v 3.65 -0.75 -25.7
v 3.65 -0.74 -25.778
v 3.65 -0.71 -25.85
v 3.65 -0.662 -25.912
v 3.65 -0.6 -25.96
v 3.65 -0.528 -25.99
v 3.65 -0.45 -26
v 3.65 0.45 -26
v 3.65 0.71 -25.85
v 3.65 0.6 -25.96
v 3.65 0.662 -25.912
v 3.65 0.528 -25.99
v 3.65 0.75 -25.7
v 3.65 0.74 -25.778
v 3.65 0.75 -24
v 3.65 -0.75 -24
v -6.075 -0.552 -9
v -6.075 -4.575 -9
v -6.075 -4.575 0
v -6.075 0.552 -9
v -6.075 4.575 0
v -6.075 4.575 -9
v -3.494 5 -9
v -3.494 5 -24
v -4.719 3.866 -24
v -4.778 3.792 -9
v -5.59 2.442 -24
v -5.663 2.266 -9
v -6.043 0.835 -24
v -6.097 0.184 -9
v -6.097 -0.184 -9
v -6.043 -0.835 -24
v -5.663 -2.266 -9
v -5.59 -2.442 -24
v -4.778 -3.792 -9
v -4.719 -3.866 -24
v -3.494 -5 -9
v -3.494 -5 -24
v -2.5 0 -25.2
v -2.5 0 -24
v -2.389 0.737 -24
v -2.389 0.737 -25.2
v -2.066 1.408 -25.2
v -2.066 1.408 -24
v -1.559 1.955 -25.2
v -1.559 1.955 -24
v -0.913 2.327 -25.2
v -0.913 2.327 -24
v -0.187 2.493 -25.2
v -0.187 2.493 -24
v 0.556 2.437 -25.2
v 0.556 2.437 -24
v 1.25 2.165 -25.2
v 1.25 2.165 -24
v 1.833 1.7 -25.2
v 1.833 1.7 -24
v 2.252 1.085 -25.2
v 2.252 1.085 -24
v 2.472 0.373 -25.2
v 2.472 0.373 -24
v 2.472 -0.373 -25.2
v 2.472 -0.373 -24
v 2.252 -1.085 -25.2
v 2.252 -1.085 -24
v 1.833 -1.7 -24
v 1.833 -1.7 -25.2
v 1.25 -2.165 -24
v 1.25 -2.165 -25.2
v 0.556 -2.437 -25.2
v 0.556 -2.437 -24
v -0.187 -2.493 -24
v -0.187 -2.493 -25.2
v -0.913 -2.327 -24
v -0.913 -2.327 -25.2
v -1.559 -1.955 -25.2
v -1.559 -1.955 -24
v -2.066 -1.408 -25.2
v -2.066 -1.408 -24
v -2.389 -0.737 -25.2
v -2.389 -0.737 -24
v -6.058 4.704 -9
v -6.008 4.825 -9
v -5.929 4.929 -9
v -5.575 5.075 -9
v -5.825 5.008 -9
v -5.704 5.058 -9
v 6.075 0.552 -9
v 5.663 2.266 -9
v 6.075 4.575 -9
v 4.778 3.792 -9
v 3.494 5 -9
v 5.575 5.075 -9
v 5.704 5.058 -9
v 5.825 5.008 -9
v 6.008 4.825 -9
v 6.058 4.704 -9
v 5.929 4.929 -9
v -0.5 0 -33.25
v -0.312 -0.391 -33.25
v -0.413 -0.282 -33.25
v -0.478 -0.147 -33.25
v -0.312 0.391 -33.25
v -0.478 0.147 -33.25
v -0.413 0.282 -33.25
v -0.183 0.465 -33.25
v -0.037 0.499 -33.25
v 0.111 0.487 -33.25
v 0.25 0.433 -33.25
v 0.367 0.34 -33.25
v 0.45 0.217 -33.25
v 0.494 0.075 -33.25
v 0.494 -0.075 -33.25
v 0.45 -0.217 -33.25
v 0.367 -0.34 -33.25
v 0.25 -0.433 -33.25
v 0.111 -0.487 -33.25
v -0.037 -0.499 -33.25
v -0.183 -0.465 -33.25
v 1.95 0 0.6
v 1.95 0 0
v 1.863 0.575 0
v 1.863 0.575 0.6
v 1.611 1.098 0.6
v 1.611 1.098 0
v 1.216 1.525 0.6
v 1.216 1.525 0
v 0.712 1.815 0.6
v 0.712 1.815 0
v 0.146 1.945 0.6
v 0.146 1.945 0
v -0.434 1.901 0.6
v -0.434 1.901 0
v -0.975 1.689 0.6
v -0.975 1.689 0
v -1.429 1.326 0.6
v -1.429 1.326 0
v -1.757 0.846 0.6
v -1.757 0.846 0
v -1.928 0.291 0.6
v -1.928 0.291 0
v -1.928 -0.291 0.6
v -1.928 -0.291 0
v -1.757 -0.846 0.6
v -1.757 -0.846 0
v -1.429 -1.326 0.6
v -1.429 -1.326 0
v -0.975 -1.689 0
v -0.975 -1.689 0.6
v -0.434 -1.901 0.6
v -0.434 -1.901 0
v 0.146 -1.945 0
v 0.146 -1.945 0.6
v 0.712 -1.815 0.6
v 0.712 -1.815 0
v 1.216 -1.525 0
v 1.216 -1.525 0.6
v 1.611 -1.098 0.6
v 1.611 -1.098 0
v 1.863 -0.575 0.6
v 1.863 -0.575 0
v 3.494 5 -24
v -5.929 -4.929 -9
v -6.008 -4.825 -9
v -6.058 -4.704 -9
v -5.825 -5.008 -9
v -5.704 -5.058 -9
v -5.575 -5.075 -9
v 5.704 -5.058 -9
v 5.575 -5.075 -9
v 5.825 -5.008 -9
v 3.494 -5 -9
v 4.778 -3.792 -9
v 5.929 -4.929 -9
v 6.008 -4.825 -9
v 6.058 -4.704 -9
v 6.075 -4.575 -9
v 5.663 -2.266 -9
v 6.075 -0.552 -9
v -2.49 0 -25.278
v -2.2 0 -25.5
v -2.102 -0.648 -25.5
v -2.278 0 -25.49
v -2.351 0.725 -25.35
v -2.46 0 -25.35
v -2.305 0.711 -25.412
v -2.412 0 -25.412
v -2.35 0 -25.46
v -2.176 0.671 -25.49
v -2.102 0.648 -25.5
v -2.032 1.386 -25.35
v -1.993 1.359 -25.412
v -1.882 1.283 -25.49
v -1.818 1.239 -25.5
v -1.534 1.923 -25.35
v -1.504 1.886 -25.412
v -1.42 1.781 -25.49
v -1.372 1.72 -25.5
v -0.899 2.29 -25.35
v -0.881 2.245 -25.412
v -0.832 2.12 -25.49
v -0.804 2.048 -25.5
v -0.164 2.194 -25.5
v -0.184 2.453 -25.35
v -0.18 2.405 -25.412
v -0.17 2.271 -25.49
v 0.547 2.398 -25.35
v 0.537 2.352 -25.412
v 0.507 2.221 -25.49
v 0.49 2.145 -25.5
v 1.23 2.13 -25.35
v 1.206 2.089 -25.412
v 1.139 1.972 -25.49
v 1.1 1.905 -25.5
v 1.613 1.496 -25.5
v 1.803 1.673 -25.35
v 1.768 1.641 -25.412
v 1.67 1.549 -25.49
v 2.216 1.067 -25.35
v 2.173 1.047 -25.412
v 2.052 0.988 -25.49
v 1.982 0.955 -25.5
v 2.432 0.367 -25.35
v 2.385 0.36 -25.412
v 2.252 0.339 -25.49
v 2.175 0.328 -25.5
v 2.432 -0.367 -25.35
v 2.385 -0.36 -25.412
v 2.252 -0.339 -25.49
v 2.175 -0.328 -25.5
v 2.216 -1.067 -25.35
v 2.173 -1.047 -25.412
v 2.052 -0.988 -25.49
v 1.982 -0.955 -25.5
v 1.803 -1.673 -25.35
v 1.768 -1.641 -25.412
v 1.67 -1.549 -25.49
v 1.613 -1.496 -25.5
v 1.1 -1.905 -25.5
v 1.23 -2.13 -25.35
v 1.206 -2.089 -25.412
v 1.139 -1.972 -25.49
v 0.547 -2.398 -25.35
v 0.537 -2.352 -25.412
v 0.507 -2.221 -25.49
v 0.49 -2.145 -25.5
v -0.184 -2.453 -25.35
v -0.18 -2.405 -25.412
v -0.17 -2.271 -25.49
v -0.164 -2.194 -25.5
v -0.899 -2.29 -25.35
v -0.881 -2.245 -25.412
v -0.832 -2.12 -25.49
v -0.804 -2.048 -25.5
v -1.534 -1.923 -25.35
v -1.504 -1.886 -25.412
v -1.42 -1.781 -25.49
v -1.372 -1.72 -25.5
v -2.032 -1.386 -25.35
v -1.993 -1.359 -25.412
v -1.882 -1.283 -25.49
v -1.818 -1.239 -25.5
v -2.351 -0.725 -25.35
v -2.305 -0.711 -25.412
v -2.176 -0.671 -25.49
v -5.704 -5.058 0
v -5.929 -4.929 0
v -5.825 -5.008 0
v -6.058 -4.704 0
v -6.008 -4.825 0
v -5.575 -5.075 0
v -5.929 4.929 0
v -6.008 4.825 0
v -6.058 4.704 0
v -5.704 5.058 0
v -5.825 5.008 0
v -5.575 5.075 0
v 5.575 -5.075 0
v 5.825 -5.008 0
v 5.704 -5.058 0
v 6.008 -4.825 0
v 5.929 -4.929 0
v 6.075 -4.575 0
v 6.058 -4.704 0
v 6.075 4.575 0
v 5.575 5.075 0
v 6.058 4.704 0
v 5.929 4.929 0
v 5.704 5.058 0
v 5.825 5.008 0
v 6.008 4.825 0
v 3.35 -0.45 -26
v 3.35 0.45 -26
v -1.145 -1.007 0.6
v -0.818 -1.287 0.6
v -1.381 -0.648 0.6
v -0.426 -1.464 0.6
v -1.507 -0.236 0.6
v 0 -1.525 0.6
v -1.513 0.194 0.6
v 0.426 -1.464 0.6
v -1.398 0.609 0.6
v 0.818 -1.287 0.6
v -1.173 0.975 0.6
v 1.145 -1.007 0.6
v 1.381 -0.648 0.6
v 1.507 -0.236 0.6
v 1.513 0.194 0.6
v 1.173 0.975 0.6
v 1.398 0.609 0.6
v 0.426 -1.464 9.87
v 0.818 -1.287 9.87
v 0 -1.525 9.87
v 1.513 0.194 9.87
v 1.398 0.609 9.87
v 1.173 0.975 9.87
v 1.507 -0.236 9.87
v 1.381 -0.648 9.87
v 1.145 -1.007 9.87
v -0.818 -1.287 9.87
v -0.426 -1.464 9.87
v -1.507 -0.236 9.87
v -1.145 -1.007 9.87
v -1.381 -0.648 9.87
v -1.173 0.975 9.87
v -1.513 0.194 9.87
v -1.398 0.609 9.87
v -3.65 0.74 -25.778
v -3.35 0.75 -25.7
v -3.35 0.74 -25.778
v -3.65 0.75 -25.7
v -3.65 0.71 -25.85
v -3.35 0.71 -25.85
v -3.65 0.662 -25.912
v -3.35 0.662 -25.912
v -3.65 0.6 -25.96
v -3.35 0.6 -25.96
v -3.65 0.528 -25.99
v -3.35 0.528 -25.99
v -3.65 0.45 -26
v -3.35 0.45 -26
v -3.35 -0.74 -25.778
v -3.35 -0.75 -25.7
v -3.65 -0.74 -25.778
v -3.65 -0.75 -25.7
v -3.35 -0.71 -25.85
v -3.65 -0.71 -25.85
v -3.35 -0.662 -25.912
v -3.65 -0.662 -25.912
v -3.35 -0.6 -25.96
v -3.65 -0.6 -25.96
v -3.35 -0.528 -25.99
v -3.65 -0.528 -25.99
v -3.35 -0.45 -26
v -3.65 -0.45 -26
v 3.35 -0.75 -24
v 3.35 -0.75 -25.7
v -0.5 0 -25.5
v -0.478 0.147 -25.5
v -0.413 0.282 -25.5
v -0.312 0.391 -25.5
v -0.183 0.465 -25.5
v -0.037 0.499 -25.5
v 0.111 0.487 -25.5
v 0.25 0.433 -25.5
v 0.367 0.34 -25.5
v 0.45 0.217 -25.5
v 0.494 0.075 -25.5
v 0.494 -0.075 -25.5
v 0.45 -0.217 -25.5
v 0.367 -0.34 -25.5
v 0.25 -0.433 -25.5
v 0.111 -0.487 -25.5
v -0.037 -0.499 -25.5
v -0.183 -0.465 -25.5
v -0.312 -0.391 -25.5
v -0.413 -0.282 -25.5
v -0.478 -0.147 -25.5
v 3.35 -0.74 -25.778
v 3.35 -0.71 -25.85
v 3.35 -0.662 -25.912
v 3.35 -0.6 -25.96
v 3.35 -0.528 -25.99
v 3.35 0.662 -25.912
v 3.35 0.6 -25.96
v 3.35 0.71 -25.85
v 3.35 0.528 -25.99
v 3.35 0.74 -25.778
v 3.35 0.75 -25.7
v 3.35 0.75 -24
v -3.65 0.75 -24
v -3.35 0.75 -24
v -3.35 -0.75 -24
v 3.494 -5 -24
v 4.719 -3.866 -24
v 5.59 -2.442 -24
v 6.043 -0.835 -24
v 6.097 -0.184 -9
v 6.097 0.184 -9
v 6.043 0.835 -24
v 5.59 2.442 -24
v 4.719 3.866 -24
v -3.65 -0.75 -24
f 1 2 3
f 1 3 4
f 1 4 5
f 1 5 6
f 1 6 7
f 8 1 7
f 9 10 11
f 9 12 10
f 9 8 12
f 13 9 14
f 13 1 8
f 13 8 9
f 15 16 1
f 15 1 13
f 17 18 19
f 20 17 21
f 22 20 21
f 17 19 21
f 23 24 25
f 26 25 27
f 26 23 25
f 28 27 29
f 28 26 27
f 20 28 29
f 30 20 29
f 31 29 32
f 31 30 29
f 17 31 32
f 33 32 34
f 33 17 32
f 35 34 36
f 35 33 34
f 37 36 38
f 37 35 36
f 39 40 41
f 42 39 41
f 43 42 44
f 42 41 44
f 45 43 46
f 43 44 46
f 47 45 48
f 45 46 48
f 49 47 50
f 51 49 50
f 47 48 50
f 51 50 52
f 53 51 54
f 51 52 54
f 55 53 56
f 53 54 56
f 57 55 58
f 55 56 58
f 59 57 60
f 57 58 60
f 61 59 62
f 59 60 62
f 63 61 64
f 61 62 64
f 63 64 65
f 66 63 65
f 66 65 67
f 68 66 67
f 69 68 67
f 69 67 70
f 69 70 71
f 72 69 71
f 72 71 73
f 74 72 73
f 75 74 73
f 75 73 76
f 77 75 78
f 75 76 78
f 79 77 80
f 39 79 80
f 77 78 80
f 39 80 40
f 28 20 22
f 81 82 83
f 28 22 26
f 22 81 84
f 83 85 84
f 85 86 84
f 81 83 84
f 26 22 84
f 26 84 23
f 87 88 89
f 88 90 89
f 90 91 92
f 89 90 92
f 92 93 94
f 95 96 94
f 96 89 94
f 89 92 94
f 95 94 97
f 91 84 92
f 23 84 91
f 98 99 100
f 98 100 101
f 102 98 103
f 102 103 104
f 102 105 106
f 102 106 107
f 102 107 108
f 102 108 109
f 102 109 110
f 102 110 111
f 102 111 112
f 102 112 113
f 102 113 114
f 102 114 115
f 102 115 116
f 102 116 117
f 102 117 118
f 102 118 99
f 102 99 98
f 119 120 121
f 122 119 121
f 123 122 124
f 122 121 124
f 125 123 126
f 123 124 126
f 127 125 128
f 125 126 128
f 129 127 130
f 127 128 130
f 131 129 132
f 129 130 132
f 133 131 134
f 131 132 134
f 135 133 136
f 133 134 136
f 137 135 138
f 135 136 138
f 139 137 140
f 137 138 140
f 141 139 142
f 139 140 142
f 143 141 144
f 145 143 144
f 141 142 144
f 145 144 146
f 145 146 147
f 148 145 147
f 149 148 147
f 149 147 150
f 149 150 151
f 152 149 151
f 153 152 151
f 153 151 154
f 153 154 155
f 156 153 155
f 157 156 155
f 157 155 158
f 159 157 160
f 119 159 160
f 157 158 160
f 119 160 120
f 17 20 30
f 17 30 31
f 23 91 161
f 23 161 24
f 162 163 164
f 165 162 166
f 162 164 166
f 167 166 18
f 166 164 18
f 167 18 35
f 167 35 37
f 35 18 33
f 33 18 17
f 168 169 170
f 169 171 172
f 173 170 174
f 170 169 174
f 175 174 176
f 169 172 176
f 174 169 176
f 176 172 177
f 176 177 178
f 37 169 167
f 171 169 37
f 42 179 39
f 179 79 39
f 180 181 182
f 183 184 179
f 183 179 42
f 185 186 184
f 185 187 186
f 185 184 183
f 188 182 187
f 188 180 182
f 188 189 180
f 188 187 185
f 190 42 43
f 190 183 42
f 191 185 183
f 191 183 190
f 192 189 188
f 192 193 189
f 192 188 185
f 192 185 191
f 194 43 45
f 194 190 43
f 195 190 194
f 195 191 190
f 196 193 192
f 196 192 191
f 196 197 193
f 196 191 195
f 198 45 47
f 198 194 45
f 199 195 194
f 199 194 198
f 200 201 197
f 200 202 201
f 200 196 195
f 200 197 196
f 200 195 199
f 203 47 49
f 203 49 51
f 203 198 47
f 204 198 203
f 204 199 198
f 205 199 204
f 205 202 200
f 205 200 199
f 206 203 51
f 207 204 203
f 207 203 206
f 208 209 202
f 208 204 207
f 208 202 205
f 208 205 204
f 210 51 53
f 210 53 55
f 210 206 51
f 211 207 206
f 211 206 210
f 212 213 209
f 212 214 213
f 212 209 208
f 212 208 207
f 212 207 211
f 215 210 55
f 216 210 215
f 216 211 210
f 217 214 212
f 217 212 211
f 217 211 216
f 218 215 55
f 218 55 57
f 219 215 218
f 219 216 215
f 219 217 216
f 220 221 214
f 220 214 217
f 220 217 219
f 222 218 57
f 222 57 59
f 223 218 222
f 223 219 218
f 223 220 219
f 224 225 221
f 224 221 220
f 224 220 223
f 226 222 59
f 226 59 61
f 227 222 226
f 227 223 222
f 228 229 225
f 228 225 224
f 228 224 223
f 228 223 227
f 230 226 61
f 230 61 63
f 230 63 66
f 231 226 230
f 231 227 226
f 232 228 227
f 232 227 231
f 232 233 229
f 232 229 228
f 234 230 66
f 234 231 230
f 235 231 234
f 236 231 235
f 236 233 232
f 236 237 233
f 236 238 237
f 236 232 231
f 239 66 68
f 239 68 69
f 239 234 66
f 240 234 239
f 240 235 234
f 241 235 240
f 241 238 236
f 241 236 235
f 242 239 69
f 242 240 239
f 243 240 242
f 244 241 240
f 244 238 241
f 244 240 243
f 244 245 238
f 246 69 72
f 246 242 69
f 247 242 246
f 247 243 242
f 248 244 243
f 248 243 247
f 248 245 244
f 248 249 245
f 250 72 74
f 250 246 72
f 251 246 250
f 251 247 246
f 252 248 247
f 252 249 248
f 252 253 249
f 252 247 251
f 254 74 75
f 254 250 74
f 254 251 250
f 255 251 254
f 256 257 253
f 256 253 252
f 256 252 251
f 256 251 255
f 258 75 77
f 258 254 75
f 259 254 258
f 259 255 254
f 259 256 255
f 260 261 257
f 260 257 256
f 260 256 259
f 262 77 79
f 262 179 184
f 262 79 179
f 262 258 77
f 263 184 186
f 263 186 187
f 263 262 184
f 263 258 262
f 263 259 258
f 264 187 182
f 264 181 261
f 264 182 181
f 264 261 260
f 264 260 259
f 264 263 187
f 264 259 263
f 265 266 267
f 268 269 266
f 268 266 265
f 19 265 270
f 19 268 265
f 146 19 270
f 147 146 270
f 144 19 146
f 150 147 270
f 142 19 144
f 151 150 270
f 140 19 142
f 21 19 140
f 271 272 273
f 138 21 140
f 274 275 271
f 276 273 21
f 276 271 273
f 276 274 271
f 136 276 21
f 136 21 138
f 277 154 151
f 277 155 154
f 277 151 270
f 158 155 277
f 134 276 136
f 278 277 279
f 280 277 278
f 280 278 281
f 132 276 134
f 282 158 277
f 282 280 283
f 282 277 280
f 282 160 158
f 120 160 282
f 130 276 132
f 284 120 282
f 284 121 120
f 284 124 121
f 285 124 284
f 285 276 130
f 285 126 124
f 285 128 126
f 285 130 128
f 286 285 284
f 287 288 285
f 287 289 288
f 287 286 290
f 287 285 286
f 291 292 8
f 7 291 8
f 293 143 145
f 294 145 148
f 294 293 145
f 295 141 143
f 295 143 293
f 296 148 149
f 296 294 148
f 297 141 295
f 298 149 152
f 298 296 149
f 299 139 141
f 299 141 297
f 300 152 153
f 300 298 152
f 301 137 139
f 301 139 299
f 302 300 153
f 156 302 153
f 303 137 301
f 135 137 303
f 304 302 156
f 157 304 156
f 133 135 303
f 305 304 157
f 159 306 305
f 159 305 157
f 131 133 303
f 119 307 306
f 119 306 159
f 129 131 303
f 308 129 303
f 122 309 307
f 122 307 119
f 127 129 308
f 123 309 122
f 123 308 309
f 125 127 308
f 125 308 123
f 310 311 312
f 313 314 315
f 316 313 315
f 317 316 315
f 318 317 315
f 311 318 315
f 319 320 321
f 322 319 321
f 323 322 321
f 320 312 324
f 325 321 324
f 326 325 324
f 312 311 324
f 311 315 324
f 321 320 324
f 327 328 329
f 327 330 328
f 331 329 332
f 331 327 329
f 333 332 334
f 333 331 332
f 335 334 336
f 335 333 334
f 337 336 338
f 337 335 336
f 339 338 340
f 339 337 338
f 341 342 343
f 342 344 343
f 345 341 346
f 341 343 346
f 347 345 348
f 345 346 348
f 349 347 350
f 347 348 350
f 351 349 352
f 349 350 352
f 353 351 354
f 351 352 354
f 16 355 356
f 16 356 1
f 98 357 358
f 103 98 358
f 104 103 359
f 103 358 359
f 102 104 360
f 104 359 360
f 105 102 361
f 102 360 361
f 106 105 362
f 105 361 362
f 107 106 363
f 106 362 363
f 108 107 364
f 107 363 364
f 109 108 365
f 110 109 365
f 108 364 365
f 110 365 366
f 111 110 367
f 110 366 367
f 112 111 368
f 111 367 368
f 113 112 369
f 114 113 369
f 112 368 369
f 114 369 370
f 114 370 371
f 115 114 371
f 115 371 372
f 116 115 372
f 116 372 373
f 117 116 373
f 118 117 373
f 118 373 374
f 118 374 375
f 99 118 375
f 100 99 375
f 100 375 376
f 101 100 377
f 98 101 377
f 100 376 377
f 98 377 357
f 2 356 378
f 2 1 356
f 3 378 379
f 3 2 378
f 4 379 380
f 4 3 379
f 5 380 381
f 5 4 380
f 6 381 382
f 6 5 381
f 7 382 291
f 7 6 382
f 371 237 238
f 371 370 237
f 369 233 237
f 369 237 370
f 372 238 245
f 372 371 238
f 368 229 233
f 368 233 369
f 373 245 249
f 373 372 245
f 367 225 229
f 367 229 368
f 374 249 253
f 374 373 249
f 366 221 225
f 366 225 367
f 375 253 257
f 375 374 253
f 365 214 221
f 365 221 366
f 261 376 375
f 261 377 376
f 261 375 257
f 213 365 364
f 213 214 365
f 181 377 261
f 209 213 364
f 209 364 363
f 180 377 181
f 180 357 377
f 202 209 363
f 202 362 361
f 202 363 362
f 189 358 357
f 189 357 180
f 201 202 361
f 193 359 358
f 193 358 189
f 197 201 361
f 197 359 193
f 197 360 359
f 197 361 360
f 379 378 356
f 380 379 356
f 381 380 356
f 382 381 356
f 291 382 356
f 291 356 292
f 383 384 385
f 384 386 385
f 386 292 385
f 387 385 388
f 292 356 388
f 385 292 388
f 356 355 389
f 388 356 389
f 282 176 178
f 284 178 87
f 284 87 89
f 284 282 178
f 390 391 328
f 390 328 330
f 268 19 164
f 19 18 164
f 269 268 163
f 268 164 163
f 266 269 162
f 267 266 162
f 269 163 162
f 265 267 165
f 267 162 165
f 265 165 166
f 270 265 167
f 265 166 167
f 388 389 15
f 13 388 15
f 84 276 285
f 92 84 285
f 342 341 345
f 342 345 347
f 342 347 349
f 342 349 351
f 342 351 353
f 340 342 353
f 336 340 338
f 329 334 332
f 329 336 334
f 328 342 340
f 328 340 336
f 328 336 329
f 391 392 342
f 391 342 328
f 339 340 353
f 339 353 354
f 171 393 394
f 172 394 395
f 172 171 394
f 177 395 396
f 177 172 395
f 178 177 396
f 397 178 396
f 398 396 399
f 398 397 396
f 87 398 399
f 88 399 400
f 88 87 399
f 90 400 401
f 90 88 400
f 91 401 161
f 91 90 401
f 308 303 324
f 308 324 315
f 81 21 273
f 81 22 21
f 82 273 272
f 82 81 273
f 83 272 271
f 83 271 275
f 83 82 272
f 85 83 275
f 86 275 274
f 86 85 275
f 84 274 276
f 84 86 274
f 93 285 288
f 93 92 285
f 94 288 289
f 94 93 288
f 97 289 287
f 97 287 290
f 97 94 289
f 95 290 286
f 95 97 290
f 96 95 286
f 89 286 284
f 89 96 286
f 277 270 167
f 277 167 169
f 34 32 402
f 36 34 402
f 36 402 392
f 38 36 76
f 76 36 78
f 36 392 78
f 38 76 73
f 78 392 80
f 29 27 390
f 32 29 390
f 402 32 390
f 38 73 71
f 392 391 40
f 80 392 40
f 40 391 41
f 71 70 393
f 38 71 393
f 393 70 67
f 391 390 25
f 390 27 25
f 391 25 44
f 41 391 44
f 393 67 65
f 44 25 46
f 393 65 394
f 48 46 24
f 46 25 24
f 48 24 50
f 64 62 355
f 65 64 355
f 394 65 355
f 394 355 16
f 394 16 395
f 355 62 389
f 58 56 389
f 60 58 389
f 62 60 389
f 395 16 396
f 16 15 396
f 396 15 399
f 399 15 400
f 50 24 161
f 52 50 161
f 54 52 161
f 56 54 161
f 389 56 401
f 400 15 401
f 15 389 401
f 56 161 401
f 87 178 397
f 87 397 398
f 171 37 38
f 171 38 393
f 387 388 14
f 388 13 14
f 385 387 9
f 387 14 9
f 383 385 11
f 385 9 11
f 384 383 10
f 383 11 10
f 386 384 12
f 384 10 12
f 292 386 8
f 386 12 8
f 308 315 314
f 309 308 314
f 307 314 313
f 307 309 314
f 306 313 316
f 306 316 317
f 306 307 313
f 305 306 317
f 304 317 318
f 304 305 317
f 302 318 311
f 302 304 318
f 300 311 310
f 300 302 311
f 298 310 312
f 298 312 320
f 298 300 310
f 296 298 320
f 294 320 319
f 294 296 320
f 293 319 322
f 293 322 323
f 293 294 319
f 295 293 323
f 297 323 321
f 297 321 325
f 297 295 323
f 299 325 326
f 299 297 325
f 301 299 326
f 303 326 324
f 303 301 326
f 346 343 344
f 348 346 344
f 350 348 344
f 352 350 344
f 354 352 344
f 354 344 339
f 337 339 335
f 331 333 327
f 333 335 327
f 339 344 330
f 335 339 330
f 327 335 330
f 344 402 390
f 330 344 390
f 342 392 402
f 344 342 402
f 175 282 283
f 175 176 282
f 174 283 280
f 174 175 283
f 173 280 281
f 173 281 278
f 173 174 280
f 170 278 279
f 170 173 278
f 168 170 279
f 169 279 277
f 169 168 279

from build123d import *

# Parameters (mm, degrees)
SKETCH1_W            = 12.15
SKETCH1_H            = 10.15
EXTRUDE2_DEPTH       = 9
SKETCH11_R           = 1.95
EXTRUDE5_DEPTH       = 0.6
EXTRUDE6_DEPTH       = 9.27
EXTRUDE7_DEPTH       = 15
SKETCH14_R           = 2.5
EXTRUDE8_DEPTH       = 1.5
SKETCH16_W           = 0.3
SKETCH16_H           = 1.5
EXTRUDE10_DEPTH      = 2
FILLET1_R            = 0.3
FILLET1_OF_MIRROR1_R = 0.3
FILLET2_R            = 0.5
FILLET3_R            = 0.3
SKETCH17_R           = 0.5
EXTRUDE11_DEPTH      = 7.75


with BuildPart() as part:
    # Sketch1 → Extrude2 (new body)
    with BuildSketch(Plane.XY):
        Rectangle(SKETCH1_W, SKETCH1_H)
    extrude(amount=-EXTRUDE2_DEPTH)

    # Sketch11 → Extrude5 (add)
    with BuildSketch(Plane.XY):
        Circle(SKETCH11_R)
    extrude(amount=EXTRUDE5_DEPTH)

    # Sketch12 → Extrude6 (add)
    with BuildSketch(Plane.XY.offset(0.6)):
        with BuildLine():
            Line((-1.17260394, 0.975), (1.17260394, 0.975))
            ThreePointArc((1.17260394, 0.975), (0, -1.525), (-1.17260394, 0.975))
        make_face()
    extrude(amount=EXTRUDE6_DEPTH)

    # Sketch13 → Extrude7 (add)
    with BuildSketch(Plane(origin=(0, 0, -9), x_dir=(-1, 0, 0), z_dir=(0, 0, -1))):
        with BuildLine():
            Line((-3.494281042, 5), (3.494281042, 5))
            ThreePointArc((3.494281042, 5), (6.1, 0), (3.494281042, -5))
            Line((3.494281042, -5), (-3.494281042, -5))
            ThreePointArc((-3.494281042, -5), (-6.1, 0), (-3.494281042, 5))
        make_face()
    extrude(amount=EXTRUDE7_DEPTH)

    # Sketch14 → Extrude8 (add)
    with BuildSketch(Plane(origin=(0, 0, -24), x_dir=(-1, 0, 0), z_dir=(0, 0, -1))):
        Circle(SKETCH14_R)
    extrude(amount=EXTRUDE8_DEPTH)

    # Sketch16 → Extrude10 (add)
    with BuildSketch(Plane(origin=(0, 0, -24), x_dir=(-1, 0, 0), z_dir=(0, 0, -1))):
        with Locations((3.5, 0)):
            Rectangle(SKETCH16_W, SKETCH16_H)
    extrude10 = extrude(amount=EXTRUDE10_DEPTH)

    # Fillet1
    fillet1_edges = [part.edges().sort_by_distance(p)[0] for p in [
        (-3.5, -0.75, -26),
        (-3.5, 0.75, -26),
    ]]
    fillet(fillet1_edges, radius=FILLET1_R)

    # Mirror1: Extrude10 across plane
    add(extrude10.mirror(Plane(origin=(0, 0, 0), x_dir=(0, 0, 1), z_dir=(1, 0, 0))))

    # Fillet1 of Mirror1
    fillet1_of_mirror1_edges = [part.edges().sort_by_distance(p)[0] for p in [
        (3.5, -0.75, -26),
        (3.5, 0.75, -26),
    ]]
    fillet(fillet1_of_mirror1_edges, radius=FILLET1_OF_MIRROR1_R)

    # Fillet2
    fillet2_edges = [part.edges().sort_by_distance(p)[0] for p in [
        (-6.075, 5.075, -4.5),
        (6.075, 5.075, -4.5),
        (6.075, -5.075, -4.5),
        (-6.075, -5.075, -4.5),
    ]]
    fillet(fillet2_edges, radius=FILLET2_R)

    # Fillet3
    fillet3_edges = [part.edges().sort_by_distance(p)[0] for p in [
        (2.5, 0, -25.5),
    ]]
    fillet(fillet3_edges, radius=FILLET3_R)

    # Sketch17 → Extrude11 (add)
    with BuildSketch(Plane(origin=(0, 0, -25.5), x_dir=(-1, 0, 0), z_dir=(0, 0, -1))):
        Circle(SKETCH17_R)
    extrude(amount=EXTRUDE11_DEPTH)


solid = part.part
